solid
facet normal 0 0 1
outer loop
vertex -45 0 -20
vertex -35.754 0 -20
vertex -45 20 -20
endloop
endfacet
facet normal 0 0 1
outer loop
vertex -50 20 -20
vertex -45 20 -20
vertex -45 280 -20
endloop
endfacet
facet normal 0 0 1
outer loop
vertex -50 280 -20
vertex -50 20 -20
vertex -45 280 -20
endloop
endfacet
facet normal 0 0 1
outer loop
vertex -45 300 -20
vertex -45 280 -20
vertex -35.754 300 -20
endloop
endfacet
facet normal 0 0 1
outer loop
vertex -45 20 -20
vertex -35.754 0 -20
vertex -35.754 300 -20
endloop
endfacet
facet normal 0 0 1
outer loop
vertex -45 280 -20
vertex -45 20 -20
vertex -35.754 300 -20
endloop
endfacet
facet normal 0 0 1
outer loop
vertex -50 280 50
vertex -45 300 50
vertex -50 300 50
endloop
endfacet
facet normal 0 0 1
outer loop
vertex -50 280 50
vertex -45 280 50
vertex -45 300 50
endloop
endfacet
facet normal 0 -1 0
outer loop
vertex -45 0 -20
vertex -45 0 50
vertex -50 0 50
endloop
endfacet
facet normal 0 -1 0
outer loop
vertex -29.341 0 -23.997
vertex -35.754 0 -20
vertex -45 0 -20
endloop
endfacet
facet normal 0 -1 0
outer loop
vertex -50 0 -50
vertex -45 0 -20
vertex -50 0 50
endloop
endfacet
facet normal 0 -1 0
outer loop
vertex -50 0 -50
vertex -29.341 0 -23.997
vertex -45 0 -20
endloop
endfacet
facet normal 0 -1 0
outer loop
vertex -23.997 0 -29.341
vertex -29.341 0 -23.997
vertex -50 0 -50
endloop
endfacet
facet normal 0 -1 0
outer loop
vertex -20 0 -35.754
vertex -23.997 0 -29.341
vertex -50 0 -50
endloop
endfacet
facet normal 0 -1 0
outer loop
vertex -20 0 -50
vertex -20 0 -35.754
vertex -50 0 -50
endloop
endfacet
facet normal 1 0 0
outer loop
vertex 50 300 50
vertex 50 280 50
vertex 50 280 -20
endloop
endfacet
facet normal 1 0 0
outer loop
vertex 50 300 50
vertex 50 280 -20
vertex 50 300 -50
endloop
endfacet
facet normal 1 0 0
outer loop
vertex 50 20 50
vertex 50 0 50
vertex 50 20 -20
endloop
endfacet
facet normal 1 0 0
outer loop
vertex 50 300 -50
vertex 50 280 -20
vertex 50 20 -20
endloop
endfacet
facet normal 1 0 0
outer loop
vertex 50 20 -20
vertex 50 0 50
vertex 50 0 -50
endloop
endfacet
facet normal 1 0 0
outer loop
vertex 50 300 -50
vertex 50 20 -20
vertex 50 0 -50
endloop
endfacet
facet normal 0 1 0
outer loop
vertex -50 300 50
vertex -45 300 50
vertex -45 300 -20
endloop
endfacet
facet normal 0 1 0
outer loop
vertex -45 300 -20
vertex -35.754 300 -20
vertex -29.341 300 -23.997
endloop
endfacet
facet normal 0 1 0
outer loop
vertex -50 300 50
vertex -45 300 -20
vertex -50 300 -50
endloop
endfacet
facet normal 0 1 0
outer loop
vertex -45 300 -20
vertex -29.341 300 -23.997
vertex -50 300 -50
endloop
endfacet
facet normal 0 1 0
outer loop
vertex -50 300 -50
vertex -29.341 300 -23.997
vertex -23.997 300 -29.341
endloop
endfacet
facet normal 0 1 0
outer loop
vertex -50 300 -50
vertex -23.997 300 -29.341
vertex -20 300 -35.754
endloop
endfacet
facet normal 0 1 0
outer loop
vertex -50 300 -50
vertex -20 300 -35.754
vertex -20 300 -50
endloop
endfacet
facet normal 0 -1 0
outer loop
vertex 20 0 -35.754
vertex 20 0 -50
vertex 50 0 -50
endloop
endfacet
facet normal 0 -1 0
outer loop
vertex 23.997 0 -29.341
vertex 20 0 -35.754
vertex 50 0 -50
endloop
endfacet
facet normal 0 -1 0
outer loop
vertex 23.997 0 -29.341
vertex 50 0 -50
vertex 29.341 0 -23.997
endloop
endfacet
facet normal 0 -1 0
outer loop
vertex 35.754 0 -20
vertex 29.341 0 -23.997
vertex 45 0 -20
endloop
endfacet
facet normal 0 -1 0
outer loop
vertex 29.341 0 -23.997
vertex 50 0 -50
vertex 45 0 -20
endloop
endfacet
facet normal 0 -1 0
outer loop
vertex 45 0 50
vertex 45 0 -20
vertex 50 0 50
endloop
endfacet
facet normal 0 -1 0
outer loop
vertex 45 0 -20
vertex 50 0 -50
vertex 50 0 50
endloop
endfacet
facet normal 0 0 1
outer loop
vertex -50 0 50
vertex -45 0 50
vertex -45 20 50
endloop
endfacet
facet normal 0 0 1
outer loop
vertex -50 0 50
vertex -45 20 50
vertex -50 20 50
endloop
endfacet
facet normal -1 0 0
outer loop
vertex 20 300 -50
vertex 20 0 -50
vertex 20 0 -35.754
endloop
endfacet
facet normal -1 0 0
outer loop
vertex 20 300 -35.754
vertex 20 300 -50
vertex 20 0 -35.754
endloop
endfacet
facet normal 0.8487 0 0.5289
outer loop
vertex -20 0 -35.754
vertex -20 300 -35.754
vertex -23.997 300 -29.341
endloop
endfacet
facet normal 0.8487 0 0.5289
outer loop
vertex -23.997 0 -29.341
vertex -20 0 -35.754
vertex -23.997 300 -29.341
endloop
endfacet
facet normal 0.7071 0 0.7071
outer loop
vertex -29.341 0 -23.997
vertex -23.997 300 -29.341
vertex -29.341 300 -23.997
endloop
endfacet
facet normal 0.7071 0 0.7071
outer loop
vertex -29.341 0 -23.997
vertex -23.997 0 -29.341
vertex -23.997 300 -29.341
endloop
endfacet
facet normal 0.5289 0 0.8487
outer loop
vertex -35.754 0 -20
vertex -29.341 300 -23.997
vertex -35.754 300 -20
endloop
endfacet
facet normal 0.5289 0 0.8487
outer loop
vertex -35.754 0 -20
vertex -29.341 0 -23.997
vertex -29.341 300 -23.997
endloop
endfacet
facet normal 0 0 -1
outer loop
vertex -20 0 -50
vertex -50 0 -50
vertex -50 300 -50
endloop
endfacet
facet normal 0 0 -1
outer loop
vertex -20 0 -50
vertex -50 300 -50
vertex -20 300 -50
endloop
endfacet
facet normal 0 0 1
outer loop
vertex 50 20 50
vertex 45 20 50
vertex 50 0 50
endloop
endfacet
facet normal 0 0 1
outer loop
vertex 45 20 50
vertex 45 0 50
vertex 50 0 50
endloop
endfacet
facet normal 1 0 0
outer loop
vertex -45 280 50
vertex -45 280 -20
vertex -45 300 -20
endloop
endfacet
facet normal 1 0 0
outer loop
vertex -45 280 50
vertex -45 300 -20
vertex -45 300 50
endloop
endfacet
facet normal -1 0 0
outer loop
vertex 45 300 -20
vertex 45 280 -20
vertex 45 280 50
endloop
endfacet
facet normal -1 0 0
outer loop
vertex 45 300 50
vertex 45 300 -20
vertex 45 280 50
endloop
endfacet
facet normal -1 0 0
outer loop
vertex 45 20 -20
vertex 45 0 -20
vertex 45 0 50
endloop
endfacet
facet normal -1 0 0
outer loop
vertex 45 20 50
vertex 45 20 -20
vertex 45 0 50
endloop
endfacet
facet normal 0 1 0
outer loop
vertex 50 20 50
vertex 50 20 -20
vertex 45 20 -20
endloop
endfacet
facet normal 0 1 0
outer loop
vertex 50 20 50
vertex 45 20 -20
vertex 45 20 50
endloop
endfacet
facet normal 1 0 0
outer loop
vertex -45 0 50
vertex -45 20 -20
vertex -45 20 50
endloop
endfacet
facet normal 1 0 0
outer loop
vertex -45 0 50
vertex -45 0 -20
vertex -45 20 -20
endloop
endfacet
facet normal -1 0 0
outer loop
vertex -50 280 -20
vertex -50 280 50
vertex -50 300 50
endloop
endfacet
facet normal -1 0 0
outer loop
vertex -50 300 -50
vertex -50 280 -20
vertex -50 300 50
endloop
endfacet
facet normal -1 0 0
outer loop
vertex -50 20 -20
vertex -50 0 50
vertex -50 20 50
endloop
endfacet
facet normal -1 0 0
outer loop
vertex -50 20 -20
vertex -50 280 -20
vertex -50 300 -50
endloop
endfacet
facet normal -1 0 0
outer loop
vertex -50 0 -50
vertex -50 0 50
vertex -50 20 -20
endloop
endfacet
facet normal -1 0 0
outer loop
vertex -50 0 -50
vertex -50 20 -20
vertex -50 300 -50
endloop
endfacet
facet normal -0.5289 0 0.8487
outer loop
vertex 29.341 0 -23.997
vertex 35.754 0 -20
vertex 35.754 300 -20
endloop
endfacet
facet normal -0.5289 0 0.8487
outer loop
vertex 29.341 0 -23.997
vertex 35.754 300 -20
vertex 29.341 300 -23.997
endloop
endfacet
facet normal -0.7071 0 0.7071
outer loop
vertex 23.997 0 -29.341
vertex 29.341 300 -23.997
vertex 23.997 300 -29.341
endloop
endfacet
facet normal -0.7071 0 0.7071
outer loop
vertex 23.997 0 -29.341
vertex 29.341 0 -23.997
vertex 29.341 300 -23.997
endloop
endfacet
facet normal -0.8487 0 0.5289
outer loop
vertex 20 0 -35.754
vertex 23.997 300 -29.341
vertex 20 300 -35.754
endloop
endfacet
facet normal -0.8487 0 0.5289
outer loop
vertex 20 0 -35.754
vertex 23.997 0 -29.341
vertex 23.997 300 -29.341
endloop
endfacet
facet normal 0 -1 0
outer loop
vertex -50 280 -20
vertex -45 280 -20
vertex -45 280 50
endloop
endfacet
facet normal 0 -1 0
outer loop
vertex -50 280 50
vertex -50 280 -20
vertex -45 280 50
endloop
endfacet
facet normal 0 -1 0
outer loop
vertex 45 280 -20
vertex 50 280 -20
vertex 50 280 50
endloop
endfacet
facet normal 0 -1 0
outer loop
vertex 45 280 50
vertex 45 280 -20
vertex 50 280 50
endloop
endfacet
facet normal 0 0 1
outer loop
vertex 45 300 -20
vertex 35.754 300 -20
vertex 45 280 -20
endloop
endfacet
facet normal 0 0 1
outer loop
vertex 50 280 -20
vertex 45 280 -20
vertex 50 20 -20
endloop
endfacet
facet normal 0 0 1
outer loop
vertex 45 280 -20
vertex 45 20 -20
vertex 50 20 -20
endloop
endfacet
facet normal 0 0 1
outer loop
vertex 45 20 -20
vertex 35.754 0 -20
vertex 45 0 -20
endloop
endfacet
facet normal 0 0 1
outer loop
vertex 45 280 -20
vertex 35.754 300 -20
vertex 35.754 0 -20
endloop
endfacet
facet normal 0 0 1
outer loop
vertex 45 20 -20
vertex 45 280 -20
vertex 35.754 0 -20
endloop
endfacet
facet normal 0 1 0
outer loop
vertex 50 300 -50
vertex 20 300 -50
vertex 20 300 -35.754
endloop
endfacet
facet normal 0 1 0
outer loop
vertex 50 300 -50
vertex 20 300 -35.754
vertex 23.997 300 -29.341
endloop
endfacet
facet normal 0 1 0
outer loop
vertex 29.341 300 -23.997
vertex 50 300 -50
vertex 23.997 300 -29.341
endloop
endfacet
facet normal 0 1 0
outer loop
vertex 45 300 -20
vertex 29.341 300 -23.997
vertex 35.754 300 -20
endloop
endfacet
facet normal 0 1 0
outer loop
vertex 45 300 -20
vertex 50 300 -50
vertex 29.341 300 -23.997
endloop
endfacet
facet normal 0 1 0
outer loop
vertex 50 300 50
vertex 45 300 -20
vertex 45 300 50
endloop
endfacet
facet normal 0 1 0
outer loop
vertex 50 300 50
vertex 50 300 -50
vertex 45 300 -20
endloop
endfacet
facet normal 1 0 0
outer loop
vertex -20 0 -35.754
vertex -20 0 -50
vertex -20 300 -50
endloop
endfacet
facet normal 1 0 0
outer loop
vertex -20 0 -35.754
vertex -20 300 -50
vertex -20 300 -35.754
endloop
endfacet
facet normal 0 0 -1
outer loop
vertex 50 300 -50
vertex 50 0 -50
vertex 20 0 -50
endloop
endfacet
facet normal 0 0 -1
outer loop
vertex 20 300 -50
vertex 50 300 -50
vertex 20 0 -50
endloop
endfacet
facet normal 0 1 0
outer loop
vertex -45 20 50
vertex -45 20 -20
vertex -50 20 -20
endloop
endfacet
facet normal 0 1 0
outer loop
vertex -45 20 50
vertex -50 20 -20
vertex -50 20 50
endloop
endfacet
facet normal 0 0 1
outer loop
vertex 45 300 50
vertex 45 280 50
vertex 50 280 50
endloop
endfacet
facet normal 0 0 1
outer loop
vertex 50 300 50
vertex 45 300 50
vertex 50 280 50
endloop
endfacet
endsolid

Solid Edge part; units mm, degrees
sketch "Sketch1" plane through (0, 0, 0) normal (0, -1, 0) x (1, 0, 0)
  line L0 (35.754, -20) -> (45, -20)
  line L1 (45, -20) -> (45, 50)
  line L2 (45, 50) -> (50, 50)
  line L3 (50, 50) -> (50, -50)
  line L4 (50, -50) -> (20, -50)
  line L5 (20, -50) -> (20, -35.754)
  arc A0 (20, -35.754) -> (35.754, -20) centre (50, -50) cw
  line L6 (-50, 50) -> (-50, -50)
  line L7 (-50, -50) -> (-20, -50)
  line L8 (-20, -50) -> (-20, -35.754)
  arc A1 (-20, -35.754) -> (-35.754, -20) centre (-50, -50) ccw
  line L9 (-35.754, -20) -> (-45, -20)
  line L10 (-45, -20) -> (-45, 50)
  line L11 (-45, 50) -> (-50, 50)
extrude "Protrusion1" add sketch "Sketch1" against normal blind 300
sketch "Sketch2" plane through (50, 150, 0) normal (1, 0, 0) x (0, 1, 0)
  line L0 (-130, -20) -> (-130, 50)
  line L1 (130, 50) -> (-130, 50)
  line L2 (130, -20) -> (130, 50)
  line L3 (-130, -20) -> (130, -20)
extrude "ExtrudedCutout_1" cut sketch "Sketch2" against normal blind 100
